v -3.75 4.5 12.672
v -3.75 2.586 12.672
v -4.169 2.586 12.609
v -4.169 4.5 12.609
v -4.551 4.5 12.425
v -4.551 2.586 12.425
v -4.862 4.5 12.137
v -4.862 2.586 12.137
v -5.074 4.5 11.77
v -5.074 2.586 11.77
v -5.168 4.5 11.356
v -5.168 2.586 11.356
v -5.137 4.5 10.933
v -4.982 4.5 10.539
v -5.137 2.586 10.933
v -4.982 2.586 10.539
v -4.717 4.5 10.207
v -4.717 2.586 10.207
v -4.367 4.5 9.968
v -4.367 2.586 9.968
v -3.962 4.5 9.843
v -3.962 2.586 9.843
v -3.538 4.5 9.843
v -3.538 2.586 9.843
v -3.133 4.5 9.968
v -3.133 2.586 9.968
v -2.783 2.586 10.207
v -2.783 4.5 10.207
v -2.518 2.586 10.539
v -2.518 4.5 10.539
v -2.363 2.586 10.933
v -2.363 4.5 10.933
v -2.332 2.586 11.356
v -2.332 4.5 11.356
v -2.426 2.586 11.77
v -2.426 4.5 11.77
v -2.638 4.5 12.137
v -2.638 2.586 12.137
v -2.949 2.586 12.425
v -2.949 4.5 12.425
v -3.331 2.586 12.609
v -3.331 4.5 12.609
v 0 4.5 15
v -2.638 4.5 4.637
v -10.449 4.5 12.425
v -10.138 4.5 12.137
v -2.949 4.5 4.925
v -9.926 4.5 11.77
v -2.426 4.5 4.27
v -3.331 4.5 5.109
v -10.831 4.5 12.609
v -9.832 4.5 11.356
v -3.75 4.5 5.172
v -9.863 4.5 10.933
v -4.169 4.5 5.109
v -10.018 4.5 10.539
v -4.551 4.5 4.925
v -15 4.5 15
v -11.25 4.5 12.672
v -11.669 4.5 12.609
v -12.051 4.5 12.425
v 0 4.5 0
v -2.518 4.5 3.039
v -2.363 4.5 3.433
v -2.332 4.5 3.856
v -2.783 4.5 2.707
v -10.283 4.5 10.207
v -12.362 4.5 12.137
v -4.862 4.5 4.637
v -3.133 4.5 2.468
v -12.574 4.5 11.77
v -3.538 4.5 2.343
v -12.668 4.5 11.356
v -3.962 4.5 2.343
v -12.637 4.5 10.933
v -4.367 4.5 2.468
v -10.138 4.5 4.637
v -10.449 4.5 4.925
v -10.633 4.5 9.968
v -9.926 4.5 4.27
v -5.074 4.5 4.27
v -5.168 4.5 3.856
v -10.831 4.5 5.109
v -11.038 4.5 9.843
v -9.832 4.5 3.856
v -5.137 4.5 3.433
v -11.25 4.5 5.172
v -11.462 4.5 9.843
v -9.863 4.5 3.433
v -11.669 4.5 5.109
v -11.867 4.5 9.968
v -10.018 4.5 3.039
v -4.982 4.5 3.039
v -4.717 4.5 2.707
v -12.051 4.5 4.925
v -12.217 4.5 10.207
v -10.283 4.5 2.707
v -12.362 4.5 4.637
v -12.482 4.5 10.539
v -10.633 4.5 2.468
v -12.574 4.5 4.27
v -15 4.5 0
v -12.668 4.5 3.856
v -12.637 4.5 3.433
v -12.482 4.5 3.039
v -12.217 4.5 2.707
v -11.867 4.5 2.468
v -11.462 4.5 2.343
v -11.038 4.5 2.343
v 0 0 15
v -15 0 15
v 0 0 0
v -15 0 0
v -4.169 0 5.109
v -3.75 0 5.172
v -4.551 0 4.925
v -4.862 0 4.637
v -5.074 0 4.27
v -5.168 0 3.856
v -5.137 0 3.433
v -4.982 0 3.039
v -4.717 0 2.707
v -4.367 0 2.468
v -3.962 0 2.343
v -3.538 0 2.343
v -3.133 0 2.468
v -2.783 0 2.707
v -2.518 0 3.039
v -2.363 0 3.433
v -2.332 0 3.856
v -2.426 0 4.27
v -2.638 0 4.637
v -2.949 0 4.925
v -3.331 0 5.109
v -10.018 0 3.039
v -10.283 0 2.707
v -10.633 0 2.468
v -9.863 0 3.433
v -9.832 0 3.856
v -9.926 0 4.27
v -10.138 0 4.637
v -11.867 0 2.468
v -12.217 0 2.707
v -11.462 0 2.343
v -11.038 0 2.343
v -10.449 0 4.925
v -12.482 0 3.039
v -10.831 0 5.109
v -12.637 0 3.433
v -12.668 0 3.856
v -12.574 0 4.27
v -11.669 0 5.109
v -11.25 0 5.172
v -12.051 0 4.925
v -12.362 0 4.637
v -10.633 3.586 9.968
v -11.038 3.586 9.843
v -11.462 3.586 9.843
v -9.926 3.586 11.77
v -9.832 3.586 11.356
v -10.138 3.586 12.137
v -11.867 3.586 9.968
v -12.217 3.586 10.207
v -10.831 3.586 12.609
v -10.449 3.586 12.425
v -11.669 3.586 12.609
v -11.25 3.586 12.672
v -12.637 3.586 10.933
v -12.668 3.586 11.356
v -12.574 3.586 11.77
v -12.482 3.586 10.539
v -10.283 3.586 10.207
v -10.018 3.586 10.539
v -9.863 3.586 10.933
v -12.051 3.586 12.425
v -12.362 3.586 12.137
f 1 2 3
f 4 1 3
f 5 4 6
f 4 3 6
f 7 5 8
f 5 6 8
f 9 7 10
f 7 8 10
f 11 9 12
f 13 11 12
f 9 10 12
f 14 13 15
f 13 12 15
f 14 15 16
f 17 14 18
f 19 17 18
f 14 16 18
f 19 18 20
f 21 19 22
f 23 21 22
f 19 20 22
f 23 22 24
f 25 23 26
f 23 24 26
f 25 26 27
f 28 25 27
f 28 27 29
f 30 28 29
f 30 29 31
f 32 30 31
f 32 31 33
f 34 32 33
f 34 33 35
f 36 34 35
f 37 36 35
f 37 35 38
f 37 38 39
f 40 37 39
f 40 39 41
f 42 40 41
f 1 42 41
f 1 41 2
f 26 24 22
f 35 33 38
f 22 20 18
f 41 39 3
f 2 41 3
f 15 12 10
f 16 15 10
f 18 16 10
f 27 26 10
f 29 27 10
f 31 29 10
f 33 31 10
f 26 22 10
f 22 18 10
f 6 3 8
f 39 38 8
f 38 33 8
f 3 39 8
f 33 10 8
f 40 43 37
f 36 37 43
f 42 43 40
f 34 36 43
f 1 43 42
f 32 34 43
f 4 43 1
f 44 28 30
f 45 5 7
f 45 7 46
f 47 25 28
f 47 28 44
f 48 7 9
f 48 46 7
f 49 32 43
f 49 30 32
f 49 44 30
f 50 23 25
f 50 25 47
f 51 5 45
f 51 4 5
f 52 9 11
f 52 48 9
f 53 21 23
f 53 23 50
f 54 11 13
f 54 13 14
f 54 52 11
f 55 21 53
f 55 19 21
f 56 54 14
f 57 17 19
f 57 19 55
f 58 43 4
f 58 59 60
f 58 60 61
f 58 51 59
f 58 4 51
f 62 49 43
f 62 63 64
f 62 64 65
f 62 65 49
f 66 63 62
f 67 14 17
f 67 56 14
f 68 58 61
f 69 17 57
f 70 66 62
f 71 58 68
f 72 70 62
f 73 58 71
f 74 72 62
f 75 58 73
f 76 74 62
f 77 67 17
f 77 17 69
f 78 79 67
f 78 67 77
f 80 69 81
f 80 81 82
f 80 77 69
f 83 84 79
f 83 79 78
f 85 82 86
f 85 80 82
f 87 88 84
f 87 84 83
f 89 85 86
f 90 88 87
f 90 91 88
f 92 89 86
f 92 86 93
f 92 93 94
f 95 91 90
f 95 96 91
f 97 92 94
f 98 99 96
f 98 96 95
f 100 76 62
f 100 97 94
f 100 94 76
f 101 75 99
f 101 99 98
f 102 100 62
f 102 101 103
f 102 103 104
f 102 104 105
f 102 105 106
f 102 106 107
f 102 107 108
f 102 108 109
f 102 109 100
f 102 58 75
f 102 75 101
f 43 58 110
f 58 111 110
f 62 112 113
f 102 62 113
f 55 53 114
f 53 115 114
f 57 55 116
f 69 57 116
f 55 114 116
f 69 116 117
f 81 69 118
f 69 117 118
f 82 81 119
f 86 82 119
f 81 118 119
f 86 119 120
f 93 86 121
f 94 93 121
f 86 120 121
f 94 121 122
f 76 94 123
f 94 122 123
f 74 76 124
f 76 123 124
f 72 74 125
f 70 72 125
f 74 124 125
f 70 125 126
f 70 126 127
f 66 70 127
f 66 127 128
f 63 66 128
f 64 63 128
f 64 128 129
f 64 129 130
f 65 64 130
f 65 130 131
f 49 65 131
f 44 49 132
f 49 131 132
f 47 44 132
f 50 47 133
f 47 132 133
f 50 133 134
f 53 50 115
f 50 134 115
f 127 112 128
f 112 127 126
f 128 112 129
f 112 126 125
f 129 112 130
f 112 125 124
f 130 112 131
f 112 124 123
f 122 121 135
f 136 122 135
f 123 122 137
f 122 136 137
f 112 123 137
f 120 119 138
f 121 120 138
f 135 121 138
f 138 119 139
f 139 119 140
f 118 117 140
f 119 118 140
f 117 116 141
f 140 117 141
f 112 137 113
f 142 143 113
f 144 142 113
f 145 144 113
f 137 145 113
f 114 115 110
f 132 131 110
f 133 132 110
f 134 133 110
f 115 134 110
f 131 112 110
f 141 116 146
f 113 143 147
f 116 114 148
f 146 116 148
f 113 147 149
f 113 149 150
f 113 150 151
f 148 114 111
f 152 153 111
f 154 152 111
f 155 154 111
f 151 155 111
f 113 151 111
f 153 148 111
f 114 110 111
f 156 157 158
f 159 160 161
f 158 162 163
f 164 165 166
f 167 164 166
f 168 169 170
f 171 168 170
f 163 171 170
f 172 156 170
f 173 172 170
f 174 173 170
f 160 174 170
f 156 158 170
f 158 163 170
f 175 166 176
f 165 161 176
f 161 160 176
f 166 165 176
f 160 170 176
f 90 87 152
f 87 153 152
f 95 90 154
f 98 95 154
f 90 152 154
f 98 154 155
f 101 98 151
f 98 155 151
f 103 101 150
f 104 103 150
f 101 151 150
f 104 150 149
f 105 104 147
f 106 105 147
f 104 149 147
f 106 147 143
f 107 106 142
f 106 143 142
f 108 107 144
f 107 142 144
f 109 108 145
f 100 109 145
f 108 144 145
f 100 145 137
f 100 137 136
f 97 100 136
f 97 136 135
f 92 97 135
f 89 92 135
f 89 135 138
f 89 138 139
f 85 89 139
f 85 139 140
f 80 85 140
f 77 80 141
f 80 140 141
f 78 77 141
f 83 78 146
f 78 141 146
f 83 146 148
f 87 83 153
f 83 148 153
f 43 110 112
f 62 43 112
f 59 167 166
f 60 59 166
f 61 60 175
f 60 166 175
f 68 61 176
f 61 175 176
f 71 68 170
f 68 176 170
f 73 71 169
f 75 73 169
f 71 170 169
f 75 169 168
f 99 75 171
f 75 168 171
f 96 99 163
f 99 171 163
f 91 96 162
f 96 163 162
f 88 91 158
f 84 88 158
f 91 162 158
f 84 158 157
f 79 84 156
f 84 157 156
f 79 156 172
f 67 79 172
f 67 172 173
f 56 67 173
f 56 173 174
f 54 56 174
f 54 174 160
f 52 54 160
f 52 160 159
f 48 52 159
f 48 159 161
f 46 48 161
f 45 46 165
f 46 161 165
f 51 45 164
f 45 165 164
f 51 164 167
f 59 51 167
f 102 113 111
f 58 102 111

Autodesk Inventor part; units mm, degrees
ref_plane "YZ Plane" through (0, 0, 0) normal (1, 0, 0) x (0, 1, 0)
ref_plane "XY Plane" through (0, 0, 0) normal (0, 0, 1) x (1, 0, 0)
sketch "Sketch1" plane through (0, 0, 0) normal (0, 1, 0) x (-1, 0, 0)
  line L0 (15, 15) -> (0, 15)
  line L1 (0, 15) -> (0, 0)
  line L2 (0, 0) -> (15, 0)
  line L3 (15, 0) -> (15, 15)
  dimension "d0" = 15
  dimension "d1" = 15
extrude "Extrusion1" add sketch "Sketch1" along normal blind 13
sketch "Sketch2" plane through (0, 13, 0) normal (0, 1, 0) x (1, 0, 0)
  line L0 (-15, -15) -> (0, -15) construction
  line L1 (0, -15) -> (0, 0) construction
  line L2 (0, 0) -> (-15, 0) construction
  line L3 (-15, 0) -> (-15, -15) construction
  line L4 (-15, 0) -> (-15, -15) construction
  line L5 (-15, -7.5) -> (0, -7.5) construction
  line L6 (-15, -7.5) -> (0, -7.5)
  line L7 (0, -7.5) -> (0, 0)
  line L8 (0, 0) -> (-15, 0)
  line L9 (-15, 0) -> (-15, -7.5)
extrude "Extrusion2" cut sketch "Sketch2" against normal blind 4.1
sketch "Sketch3" plane through (0, 13, 0) normal (0, 1, 0) x (1, 0, 0)
  line L0 (0, -7.5) -> (-15, -7.5) construction
  line L1 (-15, -7.5) -> (-15, -15) construction
  line L2 (-15, -15) -> (0, -15) construction
  line L3 (0, -15) -> (0, -7.5) construction
  line L4 (-15, -15) -> (0, -15) construction
  line L5 (-7.5, -15) -> (-7.5, -7.5) construction
  line L6 (-15, -15) -> (-7.5, -15)
  line L7 (-7.5, -15) -> (-7.5, -7.5)
  line L8 (-7.5, -7.5) -> (-15, -7.5)
  line L9 (-15, -7.5) -> (-15, -15)
  point P0 (0, 0)
extrude "Extrusion3" add sketch "Sketch3" along normal blind 1
sketch "Sketch4" plane through (0, 8.9, 0) normal (0, 1, 0) x (1, 0, 0)
  line L0 (0, 0) -> (0, -7.5) construction
  line L1 (-15, 0) -> (0, 0) construction
  line L2 (-15, -7.5) -> (-15, 0) construction
  line L3 (0, -7.5) -> (-15, -7.5) construction
  line L4 (-7.5, -7.5) -> (-7.5, 0) construction
  line L5 (-7.5, -7.5) -> (0, -7.5)
  line L6 (0, -7.5) -> (0, 0)
  line L7 (0, 0) -> (-7.5, 0)
  line L8 (-7.5, 0) -> (-7.5, -7.5)
extrude "Extrusion4" add sketch "Sketch4" along normal blind 1
sketch "Sketch5" plane through (0, 14, 0) normal (0, 1, 0) x (1, 0, 0)
  line L0 (-15, -15) -> (-7.5, -15) construction
  line L1 (-7.5, -15) -> (-7.5, -7.5) construction
  line L2 (-7.5, -7.5) -> (-15, -7.5) construction
  line L3 (-15, -7.5) -> (-15, -15) construction
  point P0 (0, 0)
  point P1 (-11.25, -11.25)
  point P2 (-11.25, -11.25)
sketch "Sketch6" plane through (0, 13, 0) normal (0, 1, 0) x (1, 0, 0)
  line L0 (-7.5, -7.5) -> (-7.5, -15) construction
  line L1 (-7.5, -15) -> (0, -15) construction
  line L2 (0, -15) -> (0, -7.5) construction
  line L3 (0, -7.5) -> (-7.5, -7.5) construction
  point P0 (0, 0)
  point P1 (-3.75, -11.25)
sketch "Sketch7" plane through (0, 9.9, 0) normal (0, 1, 0) x (1, 0, 0)
  line L0 (0, -7.5) -> (0, 0) construction
  line L1 (0, 0) -> (-7.5, 0) construction
  line L2 (-7.5, 0) -> (-7.5, -7.5) construction
  line L3 (0, -7.5) -> (-7.5, -7.5) construction
  point P0 (-3.75, -3.75)
sketch "Sketch8" plane through (0, 8.9, 0) normal (0, 1, 0) x (1, 0, 0)
  line L0 (-7.5, -7.5) -> (-7.5, 0) construction
  line L1 (-15, 0) -> (-7.5, 0) construction
  line L2 (-15, -7.5) -> (-15, 0) construction
  line L3 (-7.5, -7.5) -> (-15, -7.5) construction
  point P0 (0, 0)
  point P1 (-11.25, -3.75)
hole "Hole1" at (-11.25, 14, 11.25) direction (0, -1, 0) diameter 2.8448 depth 10.414 counterbore diameter 5.37 counterbore depth 2.85
hole "Hole2" at (-3.75, 13, 11.25) direction (0, -1, 0) diameter 2.8448 depth 10.414 counterbore diameter 5.37 counterbore depth 2.85
hole "Hole3" at (-11.25, 8.9, 3.75) direction (0, -1, 0) diameter 2.8448 depth 10.414 counterbore diameter 5.37 counterbore depth 2.85
hole "Hole4" at (-3.75, 9.9, 3.75) direction (0, -1, 0) diameter 2.8448 depth 10.414 counterbore diameter 5.37 counterbore depth 2.85
ref_plane "Work Plane1" through (0, 4.5, 0) normal (0, 1, 0) x (-1, 0, 0)
split "Split1" plane through (0, 4.5, 0) removes the side toward (0, 1, 0)
properties part number "screwprint"
